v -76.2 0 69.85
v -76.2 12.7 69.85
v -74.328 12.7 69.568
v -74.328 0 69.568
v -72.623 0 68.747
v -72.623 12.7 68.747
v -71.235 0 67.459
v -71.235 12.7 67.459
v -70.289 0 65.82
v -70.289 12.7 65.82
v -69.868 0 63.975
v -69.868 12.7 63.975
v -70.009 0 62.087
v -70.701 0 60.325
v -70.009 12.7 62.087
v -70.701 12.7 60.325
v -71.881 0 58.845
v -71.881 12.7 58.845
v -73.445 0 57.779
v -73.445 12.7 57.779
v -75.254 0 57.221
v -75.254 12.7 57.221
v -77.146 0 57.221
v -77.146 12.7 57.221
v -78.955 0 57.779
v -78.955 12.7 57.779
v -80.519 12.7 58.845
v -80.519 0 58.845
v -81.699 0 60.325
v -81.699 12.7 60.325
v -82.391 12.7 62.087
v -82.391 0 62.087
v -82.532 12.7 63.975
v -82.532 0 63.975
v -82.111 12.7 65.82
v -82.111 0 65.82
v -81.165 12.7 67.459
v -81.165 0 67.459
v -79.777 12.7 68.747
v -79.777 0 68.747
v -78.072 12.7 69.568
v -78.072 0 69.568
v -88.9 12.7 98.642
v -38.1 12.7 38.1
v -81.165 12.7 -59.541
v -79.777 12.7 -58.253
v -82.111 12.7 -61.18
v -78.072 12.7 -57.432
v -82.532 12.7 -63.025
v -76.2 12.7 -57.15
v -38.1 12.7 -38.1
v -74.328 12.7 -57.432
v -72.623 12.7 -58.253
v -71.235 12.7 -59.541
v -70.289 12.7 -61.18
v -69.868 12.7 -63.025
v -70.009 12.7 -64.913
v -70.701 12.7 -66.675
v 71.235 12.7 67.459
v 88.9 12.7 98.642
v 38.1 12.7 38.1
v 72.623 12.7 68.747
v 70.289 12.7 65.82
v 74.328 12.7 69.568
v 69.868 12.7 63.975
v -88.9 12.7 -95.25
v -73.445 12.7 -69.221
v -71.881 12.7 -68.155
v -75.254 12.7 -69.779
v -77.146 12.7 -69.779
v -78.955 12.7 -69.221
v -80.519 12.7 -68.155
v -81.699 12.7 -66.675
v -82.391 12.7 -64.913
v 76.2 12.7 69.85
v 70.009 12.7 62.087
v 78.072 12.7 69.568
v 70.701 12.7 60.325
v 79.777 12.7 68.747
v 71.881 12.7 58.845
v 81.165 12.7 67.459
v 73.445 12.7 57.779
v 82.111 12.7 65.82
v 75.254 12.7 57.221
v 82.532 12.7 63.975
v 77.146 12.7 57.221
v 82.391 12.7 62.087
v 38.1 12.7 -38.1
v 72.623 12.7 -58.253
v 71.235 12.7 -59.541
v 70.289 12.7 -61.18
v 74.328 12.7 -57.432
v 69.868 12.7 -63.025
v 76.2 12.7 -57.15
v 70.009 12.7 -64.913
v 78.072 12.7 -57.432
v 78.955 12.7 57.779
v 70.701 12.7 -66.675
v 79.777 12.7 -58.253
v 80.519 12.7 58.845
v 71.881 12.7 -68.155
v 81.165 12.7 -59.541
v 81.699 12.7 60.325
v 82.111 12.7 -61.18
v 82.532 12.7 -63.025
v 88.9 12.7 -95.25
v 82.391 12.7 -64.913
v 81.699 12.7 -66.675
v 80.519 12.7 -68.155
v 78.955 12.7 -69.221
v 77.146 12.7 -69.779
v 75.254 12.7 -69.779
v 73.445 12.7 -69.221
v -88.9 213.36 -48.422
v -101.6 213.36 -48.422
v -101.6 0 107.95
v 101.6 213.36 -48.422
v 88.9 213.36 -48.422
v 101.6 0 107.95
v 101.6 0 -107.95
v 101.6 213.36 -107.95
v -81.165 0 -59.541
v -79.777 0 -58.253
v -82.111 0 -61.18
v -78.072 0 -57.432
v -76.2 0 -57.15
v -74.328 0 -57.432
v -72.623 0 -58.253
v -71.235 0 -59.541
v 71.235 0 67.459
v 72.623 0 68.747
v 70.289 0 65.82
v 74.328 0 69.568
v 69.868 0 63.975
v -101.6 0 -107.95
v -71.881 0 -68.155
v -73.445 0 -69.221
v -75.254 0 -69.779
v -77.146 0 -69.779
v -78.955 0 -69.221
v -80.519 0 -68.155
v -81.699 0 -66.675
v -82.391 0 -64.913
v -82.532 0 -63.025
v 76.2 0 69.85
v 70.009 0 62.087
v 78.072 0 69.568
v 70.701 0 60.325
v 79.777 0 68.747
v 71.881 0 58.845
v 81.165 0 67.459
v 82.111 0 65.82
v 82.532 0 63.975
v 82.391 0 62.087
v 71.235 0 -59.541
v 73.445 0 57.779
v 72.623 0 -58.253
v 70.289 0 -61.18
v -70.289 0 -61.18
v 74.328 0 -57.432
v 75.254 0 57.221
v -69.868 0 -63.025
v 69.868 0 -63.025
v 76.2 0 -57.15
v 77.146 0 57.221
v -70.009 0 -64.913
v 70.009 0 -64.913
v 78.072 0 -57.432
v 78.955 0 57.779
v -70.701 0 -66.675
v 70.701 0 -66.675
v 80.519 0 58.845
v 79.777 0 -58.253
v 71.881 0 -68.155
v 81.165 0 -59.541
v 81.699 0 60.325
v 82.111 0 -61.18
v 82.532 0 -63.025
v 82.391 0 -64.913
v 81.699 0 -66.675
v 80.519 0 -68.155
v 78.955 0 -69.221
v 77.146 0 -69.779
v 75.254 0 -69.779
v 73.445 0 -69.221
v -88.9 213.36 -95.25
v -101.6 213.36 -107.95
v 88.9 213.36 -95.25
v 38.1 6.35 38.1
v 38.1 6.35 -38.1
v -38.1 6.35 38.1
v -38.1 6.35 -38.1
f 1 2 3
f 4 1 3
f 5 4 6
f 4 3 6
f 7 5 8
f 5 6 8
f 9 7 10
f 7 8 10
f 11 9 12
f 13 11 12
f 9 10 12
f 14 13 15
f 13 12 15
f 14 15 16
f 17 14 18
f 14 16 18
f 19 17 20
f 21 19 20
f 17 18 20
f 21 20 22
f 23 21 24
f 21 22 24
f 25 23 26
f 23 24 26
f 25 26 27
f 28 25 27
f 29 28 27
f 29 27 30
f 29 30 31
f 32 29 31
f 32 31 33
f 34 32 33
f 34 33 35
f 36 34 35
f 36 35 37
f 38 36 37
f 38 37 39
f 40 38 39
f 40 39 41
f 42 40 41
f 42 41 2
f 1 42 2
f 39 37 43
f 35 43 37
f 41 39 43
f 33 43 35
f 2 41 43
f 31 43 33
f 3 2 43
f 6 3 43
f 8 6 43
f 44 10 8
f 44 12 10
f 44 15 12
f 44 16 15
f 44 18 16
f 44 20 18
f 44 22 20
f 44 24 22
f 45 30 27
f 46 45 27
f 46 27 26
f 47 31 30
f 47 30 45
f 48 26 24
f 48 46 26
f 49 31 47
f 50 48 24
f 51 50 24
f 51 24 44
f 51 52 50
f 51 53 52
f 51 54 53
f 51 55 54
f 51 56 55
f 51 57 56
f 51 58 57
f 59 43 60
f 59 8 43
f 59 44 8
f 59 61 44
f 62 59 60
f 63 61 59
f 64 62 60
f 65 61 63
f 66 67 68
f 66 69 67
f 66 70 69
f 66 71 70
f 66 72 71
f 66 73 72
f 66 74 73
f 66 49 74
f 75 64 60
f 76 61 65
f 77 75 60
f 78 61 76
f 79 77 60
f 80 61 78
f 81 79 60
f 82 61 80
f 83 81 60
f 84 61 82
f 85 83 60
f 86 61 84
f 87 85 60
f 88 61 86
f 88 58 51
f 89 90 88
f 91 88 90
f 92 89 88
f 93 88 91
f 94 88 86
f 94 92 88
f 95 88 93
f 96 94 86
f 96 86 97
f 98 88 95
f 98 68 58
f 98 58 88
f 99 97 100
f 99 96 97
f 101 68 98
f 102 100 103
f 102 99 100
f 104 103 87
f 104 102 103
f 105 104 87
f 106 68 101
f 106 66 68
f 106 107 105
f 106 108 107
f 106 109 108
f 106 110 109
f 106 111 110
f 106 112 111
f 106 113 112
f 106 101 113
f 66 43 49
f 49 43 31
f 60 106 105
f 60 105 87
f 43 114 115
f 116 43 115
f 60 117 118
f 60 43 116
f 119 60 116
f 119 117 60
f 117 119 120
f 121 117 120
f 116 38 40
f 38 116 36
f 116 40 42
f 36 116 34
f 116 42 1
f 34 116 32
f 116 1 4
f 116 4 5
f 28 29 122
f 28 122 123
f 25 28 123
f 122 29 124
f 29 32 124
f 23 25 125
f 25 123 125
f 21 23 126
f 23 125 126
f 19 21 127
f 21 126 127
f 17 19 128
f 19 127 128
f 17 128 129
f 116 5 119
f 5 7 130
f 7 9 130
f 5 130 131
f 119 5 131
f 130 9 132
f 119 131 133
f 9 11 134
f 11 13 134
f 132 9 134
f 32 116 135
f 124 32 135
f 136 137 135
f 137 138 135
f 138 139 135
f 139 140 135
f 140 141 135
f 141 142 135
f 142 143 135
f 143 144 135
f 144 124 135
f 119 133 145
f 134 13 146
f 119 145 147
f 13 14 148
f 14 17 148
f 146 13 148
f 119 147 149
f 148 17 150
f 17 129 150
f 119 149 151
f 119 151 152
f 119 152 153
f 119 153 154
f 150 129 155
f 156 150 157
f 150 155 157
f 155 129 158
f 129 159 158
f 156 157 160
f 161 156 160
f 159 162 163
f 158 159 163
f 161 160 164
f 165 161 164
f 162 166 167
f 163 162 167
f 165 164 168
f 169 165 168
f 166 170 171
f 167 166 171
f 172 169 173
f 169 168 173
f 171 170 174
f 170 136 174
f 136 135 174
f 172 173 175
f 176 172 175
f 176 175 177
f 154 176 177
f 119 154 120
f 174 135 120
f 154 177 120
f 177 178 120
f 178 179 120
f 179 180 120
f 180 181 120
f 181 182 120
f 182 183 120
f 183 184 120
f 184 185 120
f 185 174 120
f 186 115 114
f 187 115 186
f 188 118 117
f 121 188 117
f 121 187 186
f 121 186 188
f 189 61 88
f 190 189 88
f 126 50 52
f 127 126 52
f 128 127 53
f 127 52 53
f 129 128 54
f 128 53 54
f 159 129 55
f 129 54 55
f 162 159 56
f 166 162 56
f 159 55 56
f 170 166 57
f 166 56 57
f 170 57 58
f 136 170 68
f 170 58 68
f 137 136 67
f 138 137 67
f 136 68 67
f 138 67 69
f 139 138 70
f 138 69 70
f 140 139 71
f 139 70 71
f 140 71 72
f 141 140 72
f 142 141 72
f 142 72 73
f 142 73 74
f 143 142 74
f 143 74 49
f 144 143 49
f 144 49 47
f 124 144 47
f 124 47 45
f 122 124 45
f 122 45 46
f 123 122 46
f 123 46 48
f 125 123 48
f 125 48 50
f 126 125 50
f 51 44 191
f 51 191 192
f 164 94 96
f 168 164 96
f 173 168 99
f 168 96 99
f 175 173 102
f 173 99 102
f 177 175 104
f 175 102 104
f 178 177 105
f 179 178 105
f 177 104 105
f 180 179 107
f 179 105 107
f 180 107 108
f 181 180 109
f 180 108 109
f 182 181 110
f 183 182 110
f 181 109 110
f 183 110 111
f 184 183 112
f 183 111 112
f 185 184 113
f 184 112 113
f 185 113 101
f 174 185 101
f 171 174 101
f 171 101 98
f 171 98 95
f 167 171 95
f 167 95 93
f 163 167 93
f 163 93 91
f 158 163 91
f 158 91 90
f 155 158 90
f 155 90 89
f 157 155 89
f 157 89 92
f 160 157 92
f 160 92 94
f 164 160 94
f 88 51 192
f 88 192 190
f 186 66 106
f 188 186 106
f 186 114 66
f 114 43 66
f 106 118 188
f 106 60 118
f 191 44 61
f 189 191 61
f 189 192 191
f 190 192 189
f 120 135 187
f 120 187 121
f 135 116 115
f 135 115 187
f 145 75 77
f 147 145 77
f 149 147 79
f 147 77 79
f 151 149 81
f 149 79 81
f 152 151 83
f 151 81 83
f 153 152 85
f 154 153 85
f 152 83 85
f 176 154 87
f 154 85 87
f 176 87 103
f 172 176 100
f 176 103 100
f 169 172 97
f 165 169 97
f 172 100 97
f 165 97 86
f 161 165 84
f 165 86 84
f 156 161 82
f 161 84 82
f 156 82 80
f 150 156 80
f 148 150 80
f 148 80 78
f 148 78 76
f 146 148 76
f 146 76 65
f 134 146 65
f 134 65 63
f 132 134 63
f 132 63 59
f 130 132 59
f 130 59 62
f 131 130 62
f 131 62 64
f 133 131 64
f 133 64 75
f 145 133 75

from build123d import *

# Parameters (mm, degrees)
SKETCH1_W           = 203.2
SKETCH1_H           = 215.9
BOSS_EXTRUDE1_DEPTH = 213.36
SHELL2_T            = -12.7
SKETCH2_W           = 76.2
SKETCH2_H           = 76.2
CUT_EXTRUDE1_DEPTH  = 6.35
SKETCH3_R           = 6.35
CUT_EXTRUDE2_DEPTH  = 250.479855099
CUT_EXTRUDE3_DEPTH  = 314.792817158


with BuildPart() as part:
    # Sketch1 → Boss-Extrude1 (new body)
    with BuildSketch(Plane(origin=(0, 0, 0), x_dir=(1, 0, 0), z_dir=(0, 1, 0))):
        Rectangle(SKETCH1_W, SKETCH1_H)
    extrude(amount=BOSS_EXTRUDE1_DEPTH)

    # Shell2
    shell2_openings = [part.faces().sort_by_distance(p)[0] for p in [
        (0, 213.36, 0),
        (0, 106.68, 107.95),
    ]]
    offset(amount=SHELL2_T, openings=shell2_openings, kind=Kind.INTERSECTION)

    # Sketch2 → Cut-Extrude1 (cut)
    with BuildSketch(Plane(origin=(0, 12.7, 0), x_dir=(1, 0, 0), z_dir=(0, 1, 0))):
        Rectangle(SKETCH2_W, SKETCH2_H)
    extrude(amount=-CUT_EXTRUDE1_DEPTH, mode=Mode.SUBTRACT)

    # Sketch3 → Cut-Extrude2 (cut, through all)
    with BuildSketch(Plane(origin=(0, 12.7, 0), x_dir=(1, 0, 0), z_dir=(0, 1, 0))):
        with Locations(Location((-76.2, 63.5, 0), (0, 0, 270))):
            Circle(SKETCH3_R)
        with Locations(Location((-76.2, -63.5, 0), (0, 0, 270))):
            Circle(SKETCH3_R)
        with Locations(Location((76.2, 63.5, 0), (0, 0, 270))):
            Circle(SKETCH3_R)
        with Locations(Location((76.2, -63.5, 0), (0, 0, 270))):
            Circle(SKETCH3_R)
    extrude(amount=-CUT_EXTRUDE2_DEPTH, mode=Mode.SUBTRACT)

    # Sketch4 → Cut-Extrude3 (cut, through all)
    with BuildSketch(Plane(origin=(101.6, 0, 0), x_dir=(0, 0, -1), z_dir=(1, 0, 0))):
        Polygon((48.42184808, 213.36), (-107.95, 0), (-107.95, 213.36), align=None)
    extrude(amount=-CUT_EXTRUDE3_DEPTH, mode=Mode.SUBTRACT)


solid = part.part
